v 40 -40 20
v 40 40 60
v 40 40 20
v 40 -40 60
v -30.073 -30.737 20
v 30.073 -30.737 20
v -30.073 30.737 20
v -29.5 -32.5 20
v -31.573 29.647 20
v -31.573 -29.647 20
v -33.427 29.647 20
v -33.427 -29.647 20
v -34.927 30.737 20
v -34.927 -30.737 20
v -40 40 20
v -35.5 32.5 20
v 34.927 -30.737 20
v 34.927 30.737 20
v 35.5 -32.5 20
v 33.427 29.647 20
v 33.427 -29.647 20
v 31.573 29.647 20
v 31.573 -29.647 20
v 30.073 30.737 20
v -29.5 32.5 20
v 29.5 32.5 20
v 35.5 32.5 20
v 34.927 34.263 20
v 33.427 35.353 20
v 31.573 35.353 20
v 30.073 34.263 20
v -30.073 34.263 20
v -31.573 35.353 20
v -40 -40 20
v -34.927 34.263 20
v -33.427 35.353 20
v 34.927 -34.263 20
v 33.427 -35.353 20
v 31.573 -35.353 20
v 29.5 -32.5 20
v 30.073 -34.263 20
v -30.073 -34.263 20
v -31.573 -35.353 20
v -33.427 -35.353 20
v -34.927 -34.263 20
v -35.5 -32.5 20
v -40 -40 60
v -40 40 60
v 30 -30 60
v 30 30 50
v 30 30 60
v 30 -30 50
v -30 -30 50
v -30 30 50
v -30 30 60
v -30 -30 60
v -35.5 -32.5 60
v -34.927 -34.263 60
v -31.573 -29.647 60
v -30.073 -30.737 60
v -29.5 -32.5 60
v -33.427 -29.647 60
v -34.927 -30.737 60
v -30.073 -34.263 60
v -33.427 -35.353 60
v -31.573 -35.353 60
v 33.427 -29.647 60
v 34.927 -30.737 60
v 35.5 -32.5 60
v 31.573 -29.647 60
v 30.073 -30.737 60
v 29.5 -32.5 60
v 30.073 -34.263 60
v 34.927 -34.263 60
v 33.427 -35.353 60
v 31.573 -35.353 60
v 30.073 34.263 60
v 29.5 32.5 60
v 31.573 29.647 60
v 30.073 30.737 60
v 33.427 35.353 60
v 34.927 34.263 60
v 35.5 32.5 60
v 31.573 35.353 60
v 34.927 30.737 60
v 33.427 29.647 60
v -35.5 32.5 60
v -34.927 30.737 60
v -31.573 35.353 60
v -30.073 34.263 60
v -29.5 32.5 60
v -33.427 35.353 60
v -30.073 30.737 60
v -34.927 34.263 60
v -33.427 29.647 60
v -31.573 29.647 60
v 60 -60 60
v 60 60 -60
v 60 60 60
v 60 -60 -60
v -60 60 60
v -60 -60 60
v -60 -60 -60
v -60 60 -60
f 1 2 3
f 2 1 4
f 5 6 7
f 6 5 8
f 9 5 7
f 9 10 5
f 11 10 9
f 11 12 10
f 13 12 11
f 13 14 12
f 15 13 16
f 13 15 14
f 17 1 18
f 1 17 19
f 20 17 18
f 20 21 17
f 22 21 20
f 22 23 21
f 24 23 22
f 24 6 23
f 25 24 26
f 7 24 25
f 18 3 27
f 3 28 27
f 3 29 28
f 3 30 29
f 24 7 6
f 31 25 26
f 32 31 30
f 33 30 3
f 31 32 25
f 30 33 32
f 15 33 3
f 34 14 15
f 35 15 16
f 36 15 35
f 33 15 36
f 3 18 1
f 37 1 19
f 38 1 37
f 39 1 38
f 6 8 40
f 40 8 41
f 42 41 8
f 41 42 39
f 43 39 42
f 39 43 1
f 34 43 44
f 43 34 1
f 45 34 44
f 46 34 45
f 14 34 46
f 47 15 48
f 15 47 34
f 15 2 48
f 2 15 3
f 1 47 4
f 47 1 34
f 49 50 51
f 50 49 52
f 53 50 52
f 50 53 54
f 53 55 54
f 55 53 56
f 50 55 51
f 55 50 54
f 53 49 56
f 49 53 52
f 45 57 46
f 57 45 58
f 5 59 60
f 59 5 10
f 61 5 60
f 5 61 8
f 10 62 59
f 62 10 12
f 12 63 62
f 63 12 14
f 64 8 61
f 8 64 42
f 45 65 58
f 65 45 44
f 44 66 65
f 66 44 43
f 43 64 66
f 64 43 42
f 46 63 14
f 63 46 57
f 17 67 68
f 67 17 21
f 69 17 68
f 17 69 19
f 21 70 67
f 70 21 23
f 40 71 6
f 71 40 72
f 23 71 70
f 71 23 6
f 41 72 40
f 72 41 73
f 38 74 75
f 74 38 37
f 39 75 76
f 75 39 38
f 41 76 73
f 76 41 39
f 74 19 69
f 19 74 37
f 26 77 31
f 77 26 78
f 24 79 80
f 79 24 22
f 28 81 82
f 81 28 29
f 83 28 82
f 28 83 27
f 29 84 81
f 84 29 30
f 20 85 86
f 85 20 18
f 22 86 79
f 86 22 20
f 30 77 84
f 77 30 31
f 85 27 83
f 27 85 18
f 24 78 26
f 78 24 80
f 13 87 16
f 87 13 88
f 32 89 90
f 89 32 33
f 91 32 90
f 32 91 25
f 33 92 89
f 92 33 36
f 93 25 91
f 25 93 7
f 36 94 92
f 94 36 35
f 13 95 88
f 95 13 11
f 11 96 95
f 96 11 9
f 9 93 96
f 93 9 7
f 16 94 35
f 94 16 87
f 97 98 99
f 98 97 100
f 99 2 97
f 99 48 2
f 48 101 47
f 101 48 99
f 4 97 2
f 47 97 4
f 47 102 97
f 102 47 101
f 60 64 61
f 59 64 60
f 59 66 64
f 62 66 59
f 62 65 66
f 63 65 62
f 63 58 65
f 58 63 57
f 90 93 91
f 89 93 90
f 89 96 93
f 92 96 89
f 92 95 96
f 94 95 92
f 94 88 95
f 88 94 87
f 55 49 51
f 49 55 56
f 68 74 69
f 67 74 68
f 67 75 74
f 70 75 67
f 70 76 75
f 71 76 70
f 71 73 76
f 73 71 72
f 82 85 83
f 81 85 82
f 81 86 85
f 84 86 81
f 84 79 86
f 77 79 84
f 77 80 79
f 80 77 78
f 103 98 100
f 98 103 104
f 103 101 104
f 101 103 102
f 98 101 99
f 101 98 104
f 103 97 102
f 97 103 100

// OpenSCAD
//~/.cabal/bin/extopenscad 2.escad

$res=2;
difference(r=0.2) {
	cube(size=120, center=true, r = 0.2);
	translate([0,0,60])  
	difference(r=2){
		cube(size = [80,80,80], center = true, r = 2);
		translate([0,0,20])  
		cube(size = [60,60,60], center = true, r = 10.0);
		translate([-32.5,-32.5,0])  
		cylinder(r=3, h=200, center=true);
		translate([32.5,-32.5,0])  
		cylinder(r=3, h=200, center=true);
		translate([32.5,32.5,0])  
		cylinder(r=3, h=200, center=true);
		translate([-32.5,32.5,0])  
		cylinder(r=3, h=200, center=true);
	}

}
